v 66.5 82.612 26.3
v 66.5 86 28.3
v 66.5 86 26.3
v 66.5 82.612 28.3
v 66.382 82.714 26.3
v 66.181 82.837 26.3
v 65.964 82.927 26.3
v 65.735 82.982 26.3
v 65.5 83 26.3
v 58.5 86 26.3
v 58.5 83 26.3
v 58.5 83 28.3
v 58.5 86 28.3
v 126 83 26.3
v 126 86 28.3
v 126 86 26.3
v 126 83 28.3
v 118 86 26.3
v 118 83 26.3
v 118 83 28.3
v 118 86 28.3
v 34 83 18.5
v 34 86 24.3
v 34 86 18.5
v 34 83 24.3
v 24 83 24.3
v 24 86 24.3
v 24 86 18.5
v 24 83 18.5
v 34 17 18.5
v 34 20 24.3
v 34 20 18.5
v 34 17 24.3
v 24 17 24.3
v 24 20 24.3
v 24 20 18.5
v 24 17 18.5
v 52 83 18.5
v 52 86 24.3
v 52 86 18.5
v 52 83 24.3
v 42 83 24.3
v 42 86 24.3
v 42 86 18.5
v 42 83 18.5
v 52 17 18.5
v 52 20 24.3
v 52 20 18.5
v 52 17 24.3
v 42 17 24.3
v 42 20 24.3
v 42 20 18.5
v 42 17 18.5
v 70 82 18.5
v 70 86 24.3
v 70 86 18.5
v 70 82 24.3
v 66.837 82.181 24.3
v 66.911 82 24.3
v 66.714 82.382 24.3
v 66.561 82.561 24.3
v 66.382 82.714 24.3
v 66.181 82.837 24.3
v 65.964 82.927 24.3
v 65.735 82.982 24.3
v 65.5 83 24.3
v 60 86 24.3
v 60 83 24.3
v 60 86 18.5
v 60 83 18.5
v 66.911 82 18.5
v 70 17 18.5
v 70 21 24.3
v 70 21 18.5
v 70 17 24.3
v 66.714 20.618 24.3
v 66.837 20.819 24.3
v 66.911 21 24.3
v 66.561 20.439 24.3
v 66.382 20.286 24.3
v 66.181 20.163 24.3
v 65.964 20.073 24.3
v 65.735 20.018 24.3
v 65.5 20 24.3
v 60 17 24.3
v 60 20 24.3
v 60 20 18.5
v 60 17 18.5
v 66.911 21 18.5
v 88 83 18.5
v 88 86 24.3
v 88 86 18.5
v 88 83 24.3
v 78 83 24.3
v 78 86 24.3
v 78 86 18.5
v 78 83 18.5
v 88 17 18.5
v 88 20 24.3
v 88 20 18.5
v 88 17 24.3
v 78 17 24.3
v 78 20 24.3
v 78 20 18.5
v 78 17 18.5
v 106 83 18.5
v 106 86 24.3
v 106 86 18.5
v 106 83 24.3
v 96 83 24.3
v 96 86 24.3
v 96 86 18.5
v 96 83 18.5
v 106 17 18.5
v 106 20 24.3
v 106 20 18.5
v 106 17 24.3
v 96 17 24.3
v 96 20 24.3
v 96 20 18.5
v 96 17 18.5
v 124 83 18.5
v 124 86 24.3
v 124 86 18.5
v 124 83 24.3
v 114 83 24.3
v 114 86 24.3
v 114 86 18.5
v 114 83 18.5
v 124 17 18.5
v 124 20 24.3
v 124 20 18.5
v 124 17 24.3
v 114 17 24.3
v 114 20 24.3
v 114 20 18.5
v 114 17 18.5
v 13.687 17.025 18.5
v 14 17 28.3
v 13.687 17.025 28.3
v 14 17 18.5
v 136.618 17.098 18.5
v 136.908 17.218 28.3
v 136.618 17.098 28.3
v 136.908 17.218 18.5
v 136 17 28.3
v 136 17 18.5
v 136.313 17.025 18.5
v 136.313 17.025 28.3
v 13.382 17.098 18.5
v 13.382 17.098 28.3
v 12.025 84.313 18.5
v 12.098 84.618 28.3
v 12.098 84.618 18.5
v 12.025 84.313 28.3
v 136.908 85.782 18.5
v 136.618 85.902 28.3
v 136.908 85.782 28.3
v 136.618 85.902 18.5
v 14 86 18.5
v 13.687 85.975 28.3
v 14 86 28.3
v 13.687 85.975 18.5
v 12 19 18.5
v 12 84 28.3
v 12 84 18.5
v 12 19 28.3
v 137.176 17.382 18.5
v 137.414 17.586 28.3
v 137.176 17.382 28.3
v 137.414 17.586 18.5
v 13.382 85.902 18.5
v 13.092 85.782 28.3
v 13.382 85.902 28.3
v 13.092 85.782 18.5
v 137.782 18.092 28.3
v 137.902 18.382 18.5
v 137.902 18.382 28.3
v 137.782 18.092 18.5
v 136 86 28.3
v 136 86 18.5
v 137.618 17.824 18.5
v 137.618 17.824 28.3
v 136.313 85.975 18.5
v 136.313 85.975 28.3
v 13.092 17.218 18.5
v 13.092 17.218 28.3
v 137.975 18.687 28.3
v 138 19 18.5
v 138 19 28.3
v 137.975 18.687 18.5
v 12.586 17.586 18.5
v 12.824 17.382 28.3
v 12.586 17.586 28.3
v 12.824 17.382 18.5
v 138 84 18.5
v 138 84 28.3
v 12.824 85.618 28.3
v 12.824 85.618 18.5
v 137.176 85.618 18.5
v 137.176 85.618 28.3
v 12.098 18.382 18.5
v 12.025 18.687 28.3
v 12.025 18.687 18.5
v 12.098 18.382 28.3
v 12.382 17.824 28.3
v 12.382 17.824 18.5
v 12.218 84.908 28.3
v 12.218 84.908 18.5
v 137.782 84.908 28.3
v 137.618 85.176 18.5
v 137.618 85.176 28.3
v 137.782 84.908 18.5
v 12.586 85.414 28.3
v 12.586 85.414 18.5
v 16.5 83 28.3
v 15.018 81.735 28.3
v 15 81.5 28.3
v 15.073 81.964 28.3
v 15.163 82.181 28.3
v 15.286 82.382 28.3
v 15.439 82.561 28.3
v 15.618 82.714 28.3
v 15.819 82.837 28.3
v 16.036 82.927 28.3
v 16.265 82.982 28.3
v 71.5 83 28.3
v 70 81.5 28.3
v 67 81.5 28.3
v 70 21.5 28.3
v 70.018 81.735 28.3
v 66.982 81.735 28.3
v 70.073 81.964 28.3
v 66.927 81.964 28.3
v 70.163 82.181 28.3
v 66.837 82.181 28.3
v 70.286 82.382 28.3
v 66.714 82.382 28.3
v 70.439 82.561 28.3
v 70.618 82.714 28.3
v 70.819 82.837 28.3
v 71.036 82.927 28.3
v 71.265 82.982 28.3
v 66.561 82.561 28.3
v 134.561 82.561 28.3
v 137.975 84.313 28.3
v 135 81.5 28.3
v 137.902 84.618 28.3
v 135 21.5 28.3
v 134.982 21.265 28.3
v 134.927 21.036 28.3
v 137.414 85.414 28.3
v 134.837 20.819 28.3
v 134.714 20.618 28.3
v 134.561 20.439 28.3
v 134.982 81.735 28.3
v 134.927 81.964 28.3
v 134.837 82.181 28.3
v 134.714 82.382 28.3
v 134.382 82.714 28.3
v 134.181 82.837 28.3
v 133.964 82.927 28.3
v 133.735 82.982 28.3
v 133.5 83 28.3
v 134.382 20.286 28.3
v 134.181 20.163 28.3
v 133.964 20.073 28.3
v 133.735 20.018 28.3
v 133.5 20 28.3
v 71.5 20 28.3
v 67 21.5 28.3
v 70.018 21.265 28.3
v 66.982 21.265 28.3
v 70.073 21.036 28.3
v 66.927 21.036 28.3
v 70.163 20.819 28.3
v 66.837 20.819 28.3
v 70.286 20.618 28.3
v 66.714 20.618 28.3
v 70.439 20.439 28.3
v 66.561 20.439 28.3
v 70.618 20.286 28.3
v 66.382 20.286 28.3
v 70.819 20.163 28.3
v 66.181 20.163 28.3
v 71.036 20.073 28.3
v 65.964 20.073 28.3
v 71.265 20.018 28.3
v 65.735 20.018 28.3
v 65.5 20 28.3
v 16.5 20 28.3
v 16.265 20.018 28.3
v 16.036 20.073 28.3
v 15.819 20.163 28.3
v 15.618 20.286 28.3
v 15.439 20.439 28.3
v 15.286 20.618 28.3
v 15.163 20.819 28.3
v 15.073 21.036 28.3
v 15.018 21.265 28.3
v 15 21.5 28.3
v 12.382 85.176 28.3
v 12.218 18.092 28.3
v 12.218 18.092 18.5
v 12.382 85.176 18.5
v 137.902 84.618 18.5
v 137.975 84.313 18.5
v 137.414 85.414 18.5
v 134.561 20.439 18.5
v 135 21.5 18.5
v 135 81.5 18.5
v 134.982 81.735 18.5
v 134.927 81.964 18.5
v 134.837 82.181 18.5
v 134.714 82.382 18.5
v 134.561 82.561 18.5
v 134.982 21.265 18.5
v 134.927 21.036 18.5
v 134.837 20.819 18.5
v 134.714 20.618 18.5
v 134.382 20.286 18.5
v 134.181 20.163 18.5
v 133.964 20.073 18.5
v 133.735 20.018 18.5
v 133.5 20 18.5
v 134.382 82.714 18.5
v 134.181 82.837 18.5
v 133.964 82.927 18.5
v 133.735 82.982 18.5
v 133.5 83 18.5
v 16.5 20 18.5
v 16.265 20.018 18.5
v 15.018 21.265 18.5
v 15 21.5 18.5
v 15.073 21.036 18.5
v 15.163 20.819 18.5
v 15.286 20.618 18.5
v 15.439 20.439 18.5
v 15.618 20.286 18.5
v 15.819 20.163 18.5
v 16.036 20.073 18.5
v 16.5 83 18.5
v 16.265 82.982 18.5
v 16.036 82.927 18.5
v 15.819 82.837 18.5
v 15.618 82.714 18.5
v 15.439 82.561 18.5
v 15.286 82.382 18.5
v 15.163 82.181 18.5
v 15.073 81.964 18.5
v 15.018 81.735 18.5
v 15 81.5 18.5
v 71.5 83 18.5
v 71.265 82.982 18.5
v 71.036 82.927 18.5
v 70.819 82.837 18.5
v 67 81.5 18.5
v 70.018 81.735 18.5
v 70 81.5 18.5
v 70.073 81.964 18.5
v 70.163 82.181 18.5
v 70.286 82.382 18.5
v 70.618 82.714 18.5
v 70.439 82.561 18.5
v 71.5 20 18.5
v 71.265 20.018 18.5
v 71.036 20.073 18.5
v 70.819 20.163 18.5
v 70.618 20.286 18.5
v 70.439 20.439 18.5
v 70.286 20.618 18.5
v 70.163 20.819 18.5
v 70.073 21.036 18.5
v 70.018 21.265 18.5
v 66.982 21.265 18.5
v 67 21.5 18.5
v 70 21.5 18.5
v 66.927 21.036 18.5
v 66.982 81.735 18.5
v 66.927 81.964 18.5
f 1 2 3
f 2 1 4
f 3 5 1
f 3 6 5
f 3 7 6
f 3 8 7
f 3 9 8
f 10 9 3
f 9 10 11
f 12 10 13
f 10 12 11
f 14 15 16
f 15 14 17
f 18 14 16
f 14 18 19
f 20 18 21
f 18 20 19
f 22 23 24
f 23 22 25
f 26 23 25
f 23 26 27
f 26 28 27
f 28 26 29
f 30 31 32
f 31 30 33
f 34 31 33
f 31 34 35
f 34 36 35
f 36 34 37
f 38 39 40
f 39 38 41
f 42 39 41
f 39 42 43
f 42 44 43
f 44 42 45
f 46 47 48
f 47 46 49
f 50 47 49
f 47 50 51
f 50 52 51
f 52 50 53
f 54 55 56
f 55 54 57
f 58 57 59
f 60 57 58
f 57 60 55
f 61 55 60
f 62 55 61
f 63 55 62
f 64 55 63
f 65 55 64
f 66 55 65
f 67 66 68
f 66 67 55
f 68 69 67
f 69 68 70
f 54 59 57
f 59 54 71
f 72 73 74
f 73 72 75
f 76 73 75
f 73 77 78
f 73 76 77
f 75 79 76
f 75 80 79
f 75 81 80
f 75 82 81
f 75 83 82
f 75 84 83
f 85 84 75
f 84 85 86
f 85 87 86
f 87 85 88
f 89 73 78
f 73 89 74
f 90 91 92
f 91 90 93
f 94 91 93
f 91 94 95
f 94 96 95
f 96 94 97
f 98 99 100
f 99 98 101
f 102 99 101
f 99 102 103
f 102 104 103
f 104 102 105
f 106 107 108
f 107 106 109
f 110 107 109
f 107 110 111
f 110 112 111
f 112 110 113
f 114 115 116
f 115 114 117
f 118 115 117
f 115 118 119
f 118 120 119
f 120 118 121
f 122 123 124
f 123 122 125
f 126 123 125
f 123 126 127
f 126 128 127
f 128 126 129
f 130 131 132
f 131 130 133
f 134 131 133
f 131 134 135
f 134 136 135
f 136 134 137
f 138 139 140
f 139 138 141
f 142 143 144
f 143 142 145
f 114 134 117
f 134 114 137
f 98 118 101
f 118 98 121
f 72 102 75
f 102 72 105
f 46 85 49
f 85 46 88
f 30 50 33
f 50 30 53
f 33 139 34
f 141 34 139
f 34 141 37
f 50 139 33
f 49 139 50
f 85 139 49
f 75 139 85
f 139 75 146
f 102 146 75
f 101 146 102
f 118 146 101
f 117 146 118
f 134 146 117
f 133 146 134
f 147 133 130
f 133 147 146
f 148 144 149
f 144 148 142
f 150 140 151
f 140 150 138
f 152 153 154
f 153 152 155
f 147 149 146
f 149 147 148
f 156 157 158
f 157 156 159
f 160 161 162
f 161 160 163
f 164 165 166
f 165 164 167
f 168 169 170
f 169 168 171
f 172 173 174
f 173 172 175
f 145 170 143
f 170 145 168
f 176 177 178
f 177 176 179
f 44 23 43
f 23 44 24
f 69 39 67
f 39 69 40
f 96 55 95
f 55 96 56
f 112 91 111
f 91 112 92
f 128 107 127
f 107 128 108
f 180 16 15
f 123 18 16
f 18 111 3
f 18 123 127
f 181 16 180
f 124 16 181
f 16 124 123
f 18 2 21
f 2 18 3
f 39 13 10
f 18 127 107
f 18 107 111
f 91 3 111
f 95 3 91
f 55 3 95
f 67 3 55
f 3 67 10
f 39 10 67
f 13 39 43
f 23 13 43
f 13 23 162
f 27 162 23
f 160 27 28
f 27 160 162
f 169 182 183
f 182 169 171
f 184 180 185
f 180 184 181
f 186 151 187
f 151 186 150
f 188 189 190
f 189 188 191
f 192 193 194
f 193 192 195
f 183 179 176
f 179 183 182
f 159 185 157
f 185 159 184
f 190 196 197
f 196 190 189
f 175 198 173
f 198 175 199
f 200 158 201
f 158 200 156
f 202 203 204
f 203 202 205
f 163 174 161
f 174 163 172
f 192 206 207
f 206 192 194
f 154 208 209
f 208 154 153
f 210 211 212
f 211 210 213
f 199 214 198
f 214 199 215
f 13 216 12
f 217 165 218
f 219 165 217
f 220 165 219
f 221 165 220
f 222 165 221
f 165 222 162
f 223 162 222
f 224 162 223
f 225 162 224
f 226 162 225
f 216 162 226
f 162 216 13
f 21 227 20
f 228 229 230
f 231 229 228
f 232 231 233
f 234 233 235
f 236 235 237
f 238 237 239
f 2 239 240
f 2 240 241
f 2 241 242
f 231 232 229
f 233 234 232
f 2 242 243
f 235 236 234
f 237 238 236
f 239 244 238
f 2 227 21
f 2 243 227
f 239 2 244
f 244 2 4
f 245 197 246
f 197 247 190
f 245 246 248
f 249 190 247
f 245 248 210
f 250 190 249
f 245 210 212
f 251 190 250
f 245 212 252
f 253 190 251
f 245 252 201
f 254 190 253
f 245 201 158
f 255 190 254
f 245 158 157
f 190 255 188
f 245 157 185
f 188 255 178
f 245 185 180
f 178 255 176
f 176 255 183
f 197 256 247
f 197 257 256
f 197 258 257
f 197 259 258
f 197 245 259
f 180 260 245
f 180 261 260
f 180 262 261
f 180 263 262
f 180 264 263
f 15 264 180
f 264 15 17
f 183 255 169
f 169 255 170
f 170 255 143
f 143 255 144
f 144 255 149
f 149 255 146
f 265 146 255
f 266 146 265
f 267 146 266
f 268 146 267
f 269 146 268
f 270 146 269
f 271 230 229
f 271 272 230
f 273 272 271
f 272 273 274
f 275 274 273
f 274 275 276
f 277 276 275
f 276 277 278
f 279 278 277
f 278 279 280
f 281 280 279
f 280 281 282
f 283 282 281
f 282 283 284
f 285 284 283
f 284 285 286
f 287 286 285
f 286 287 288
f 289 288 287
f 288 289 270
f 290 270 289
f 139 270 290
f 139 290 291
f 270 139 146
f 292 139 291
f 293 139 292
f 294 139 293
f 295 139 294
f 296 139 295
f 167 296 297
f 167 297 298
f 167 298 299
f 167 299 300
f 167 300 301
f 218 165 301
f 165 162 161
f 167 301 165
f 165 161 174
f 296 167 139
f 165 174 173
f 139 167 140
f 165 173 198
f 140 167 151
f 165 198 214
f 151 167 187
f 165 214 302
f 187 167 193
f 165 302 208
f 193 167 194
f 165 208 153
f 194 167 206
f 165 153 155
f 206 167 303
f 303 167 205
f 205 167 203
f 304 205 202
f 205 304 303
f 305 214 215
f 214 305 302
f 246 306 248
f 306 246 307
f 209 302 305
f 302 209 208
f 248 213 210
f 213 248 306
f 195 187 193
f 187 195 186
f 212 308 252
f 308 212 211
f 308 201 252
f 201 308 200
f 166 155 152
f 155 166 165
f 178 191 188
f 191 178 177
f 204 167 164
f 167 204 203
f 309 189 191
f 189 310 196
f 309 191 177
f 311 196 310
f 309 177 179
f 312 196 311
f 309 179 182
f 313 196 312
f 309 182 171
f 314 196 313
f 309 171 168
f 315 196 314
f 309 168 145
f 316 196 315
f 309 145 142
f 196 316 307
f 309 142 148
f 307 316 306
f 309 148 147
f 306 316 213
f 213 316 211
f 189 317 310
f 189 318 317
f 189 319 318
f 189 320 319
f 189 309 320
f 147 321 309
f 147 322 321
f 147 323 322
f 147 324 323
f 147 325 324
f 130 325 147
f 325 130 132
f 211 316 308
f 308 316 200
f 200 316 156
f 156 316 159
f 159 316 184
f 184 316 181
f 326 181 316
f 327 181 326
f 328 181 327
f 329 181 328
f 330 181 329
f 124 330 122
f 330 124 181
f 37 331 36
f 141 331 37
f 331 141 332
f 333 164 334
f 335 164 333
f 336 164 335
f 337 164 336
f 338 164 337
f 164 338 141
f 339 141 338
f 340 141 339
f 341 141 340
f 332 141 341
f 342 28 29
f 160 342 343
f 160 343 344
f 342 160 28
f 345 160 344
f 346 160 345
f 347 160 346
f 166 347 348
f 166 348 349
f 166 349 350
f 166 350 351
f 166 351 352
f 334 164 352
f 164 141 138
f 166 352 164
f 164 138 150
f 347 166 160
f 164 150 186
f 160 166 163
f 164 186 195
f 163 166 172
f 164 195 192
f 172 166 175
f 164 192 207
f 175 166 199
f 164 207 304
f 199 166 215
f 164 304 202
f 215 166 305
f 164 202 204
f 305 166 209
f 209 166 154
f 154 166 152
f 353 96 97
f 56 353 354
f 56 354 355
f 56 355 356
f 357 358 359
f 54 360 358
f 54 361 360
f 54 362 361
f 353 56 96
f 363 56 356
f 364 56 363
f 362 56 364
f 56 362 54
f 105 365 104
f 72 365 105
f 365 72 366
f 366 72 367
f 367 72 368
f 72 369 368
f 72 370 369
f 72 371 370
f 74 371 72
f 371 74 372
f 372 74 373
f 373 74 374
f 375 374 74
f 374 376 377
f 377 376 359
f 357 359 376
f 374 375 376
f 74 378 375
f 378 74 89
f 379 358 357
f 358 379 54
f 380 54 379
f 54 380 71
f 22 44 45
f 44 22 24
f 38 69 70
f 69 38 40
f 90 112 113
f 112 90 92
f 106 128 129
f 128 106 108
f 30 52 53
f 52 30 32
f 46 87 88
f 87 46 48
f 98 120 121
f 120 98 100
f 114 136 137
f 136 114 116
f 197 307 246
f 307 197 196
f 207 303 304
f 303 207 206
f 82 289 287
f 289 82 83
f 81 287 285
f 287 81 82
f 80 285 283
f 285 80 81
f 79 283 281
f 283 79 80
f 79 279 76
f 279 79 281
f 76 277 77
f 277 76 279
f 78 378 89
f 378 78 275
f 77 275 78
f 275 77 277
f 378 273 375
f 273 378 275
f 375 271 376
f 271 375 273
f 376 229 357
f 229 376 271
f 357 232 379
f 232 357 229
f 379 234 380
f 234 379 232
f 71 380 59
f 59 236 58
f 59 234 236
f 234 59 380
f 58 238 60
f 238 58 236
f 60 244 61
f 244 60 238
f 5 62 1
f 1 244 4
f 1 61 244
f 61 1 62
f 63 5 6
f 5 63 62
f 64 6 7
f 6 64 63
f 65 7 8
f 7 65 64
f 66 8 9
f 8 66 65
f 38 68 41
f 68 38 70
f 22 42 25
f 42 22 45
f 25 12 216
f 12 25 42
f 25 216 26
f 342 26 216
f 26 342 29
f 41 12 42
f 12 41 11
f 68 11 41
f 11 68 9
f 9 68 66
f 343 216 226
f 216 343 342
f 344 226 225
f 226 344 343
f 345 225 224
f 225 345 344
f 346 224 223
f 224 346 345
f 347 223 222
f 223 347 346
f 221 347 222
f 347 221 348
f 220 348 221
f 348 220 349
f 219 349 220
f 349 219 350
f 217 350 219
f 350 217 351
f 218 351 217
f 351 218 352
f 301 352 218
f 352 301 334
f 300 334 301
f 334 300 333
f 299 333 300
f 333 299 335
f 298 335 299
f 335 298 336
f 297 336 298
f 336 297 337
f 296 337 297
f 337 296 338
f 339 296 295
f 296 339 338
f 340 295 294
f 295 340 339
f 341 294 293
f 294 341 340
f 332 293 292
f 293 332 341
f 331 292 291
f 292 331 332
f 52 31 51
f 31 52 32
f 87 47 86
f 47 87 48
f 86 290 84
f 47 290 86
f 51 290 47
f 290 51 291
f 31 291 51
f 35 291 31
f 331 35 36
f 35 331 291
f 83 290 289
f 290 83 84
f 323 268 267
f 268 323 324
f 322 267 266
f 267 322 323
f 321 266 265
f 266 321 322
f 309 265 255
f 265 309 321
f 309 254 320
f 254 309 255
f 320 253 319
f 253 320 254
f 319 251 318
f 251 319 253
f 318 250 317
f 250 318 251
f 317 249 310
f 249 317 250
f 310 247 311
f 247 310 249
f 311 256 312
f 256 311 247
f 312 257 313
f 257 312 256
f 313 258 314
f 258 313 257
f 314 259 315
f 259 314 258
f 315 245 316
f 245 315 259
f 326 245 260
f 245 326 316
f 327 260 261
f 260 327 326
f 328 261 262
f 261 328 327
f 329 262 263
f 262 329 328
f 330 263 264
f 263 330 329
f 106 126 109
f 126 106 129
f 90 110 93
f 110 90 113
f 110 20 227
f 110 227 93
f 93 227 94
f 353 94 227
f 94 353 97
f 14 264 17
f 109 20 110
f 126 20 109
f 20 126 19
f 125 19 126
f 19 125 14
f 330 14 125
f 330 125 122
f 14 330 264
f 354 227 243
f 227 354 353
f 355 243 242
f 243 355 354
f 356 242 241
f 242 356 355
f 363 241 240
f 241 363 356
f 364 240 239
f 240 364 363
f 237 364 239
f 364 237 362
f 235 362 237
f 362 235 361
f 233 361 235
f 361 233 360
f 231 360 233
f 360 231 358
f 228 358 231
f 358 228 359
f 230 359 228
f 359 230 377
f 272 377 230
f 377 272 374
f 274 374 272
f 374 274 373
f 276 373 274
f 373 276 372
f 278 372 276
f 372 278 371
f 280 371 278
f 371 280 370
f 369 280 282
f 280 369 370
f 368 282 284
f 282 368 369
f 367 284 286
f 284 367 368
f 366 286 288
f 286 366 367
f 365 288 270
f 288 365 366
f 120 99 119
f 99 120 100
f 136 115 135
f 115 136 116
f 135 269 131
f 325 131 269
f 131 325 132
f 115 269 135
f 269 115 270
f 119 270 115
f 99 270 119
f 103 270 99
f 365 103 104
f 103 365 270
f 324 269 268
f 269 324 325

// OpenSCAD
// file: common.scad
// Pi Flux r1 - reverse-engineered shared parameters
// Coordinates: x = left->right as seen from the FRONT, y = top->bottom
// (top edge = pull-switch side), z = 0 at the back surface, up towards the screen.
// Use at(x,y) to place things in these "drawing" coordinates.

$fn = 40;

// ---------------- overall ----------------
W        = 150;     // outer width
L        = 183;     // outer height
CH       = 9;       // corner chamfer
WALL     = 3;       // side wall thickness
FLOOR    = 2;       // back plate thickness
H_BOT    = 24;      // bottom shell height (split plane)
H_FACE   = 10.5;    // face part height
T        = H_BOT + H_FACE; // total thickness
PLATE    = 2;       // face plate thickness
TOL      = 0.25;

// ---------------- screws ----------------
M25_CLR  = 2.8;     // clearance hole
M25_PIL  = 2.2;     // pilot hole for self tapping into plastic (use 3.6 for brass insert)
M25_HEAD = 5.2;     // counterbore for head
BOSS_D   = 7;
// 6 case screws: 4 corners + 2 on the screen/keyboard divider
CASE_SCREWS = [[8.5,8.5],[W-8.5,8.5],[6.5,90],[W-6.5,90],[8.5,L-8.5],[W-8.5,L-8.5]];

// ---------------- display (Waveshare 5-DSI-TOUCH-A) ----------------
DISP_W = 129; DISP_H = 72.8; DISP_T = 7.8; DISP_R = 4; DISP_POST = 5;
DISP_X = (W-DISP_W)/2;  // left edge of glass
DISP_Y = 13;            // top edge of glass
DISP_Z_FRONT = T - PLATE;
DISP_Z_BACK  = DISP_Z_FRONT - DISP_T;
DISP_POST_END = DISP_Z_BACK - DISP_POST;   // where the display's own standoffs end
// outer 117 x 61 M2.5 pattern (6 / 5.9 mm from glass edges)
DISP_HOLES = [for (dx=[6, 6+117]) for (dy=[5.9, 5.9+61]) [DISP_X+dx, DISP_Y+dy]];

// ---------------- Raspberry Pi 5 (mounted on the display back) -----
// inner 58 x 49 pattern; ports point to the RIGHT wall, USB-C edge to the TOP
PI_HOLES_X = [DISP_X+45.5, DISP_X+45.5+58];
PI_HOLES_Y = [DISP_Y+11.9, DISP_Y+11.9+49];
PI_X0 = PI_HOLES_X[0]-3.5;          // non-port end of the board
PI_Y0 = PI_HOLES_Y[0]-3.5;          // USB-C / HDMI edge
PI_PCB_TOP = DISP_POST_END;         // pcb face against the posts
PI_PCB_BOT = PI_PCB_TOP - 1.6;      // component side faces the back plate
PI_USBC_X  = PI_X0 + 11.2;
PI_USBC_Z  = PI_PCB_BOT - 1.6;
// right-edge ports (centre measured from the USB-C edge, width, height)
PI_PORTS = [[10.2, 16.0, 13.6], [29.1, 13.4, 16.0], [47.0, 13.4, 16.0]];

// ---------------- battery (INIU 10000 mAh) ----------------
BAT_W = 112; BAT_H = 70; BAT_T = 16;      // measure yours!
BAT_X = (W-BAT_W)/2;
BAT_Y = L - WALL - 5.5 - BAT_H;            // leaves room for the button plunger
BTN_X = 108;                                // battery button position along the bottom edge
BTN_Z = FLOOR + BAT_T/2;
BTN_W = 6; BTN_HH = 4;                      // button plunger cross-section

// ---------------- pull switch (USB-C U adapter) ----------------
PULL_SLOT_X0 = 46.2; PULL_SLOT_W = 27.5;    // from the mat drawing (46.2 | 27.5 | 66.2)
PULL_GROOVE = 0.8;                          // floor groove the carrier rides in
// USB-C U (180 deg) adapter, standing upright: male plug on top (into the Pi),
// female socket below (battery cable, runs under the Pi / through the cooler fins)
UADP = [7.0, 12.5, 20.5];                   // body thickness(x), depth(y, excl. plug), height(z) - measure yours!
UADP_MALE_FROM_TOP = 5.25;                  // body top -> male plug centre
UADP_PLUG = 6.5;                            // male plug length
PULL_TRAVEL = 7;

// ---------------- keyboard ----------------
KB_WIN = [10, 97, 140, 164];                // x0,y0,x1,y1 of key window in face plate
KB_PCB = [137, 72];                         // keyboard PCB outline
KB_PCB_X = (W-KB_PCB[0])/2; KB_PCB_Y = 94.5;
KB_PCB_FRONT = T - 5;                       // z of the PCB front face
KB_PCB_BACK  = KB_PCB_FRONT - 1.2;

// ---------------- helpers ----------------
module at(x, y, z=0) translate([x, L-y, z]) children();

// base chamfered rectangle (in real XY, origin bottom-left)
module chamfer_rect(w, l, c) {
    polygon([[c,0],[w-c,0],[w,c],[w,l-c],[w-c,l],[c,l],[0,l-c],[0,c]]);
}

// ---------------- rugged exterior ----------------
// The body edges carry a large 45 deg chamfer (front and back), so the full-height corner
// bumpers stand proud in every view. The grip sides carry vertical ribs. All of it is
// printable without supports: the chamfers are 45 deg overhangs, the ribs are vertical.
EDGE_CZ = 3;        // edge chamfer (front + back), measured from the rib tips
BUMP    = 3;        // corner bumper protrusion beyond the body
BUMP_LX = 26;       // bumper length along the top/bottom edges (from the corner)
BUMP_LY = 21;       // ... along the sides (the first Pi port window starts at y=23)
BUMP_CZ = 1.2;      // small chamfer on the bumpers
RIB_H = 1.2; RIB_W = 1.6; RIB_P = 4;   // grip ribs: height, width, pitch
// grip rib zones: [side (0 = left, 1 = right), y0, y1] in drawing coords
RIB_ZONES = [[0, 54, 160], [1, 82, 160]];

module body2d() offset(r=1) offset(delta=-1) chamfer_rect(W, L, CH);

module ribs2d() {
    for (z = RIB_ZONES) for (y = [z[1] : RIB_P : z[2] - RIB_W]) {
        translate([z[0] ? W : 0, L - y - RIB_W]) mirror([z[0] ? 0 : 1, 0])
            polygon([[-0.5, 0], [RIB_H - 0.4, 0], [RIB_H, 0.4], [RIB_H, RIB_W - 0.4], [RIB_H - 0.4, RIB_W], [-0.5, RIB_W]]);
    }
}

// one bumper per corner; 45 deg tapered ends where it meets the body
module bumper2d() {
    win = [[-20, -20], [BUMP_LX - 20, -20], [BUMP_LX + 1, 1], [1, BUMP_LY + 1], [-20, BUMP_LY - 20]];
    intersection() {
        offset(r=1) offset(delta=-1) offset(delta=BUMP) chamfer_rect(W, L, CH);
        for (mx = [0, 1]) for (my = [0, 1])
            translate([mx * W, my * L]) mirror([mx, 0]) mirror([0, my]) polygon(win);
    }
}

// convex chamfered slab around the chamfer_rect body, grown by d
module chamfer_slab(d, c, h=T) hull() {
    linear_extrude(0.01) offset(delta=d - c) chamfer_rect(W, L, CH);
    translate([0, 0, c]) linear_extrude(h - 2 * c) offset(delta=d) chamfer_rect(W, L, CH);
    translate([0, 0, h - 0.01]) linear_extrude(0.01) offset(delta=d - c) chamfer_rect(W, L, CH);
}

// complete closed outer body, z = 0 .. T (each part intersects its own z range)
module outer_body() {
    intersection() {
        linear_extrude(T) { body2d(); ribs2d(); }
        chamfer_slab(RIB_H, EDGE_CZ);
    }
    intersection() {
        linear_extrude(T) bumper2d();
        chamfer_slab(BUMP, BUMP_CZ);
    }
}
module inner_outline() offset(delta=-WALL) offset(r=1) offset(delta=-1) chamfer_rect(W, L, CH);

module rrect(w, h, r) offset(r=r) offset(delta=-r) square([w, h]);
// main file
// Pi Flux r1 - Internal keyboard support frame
// Sits on top of the power bank and backs up the keyboard PCB (two windows for the
// keyboard's own LiPo / components). Print flat, as modelled.
include <common.scad>

KBS_Z0 = FLOOR + BAT_T + 0.5;        // underside (on the battery)
KBS_H  = KB_PCB_BACK - KBS_Z0;       // up to the back of the keyboard pcb
KBS    = [12, 97, 138, 166];         // x0,y0,x1,y1
KBS_WALL = 3;
KBS_DIV  = 68.5;                     // divider x (right window clears the keyboard LiPo)

module kb_support() {
    translate([0,0,KBS_Z0]) difference() {
        linear_extrude(KBS_H) translate([KBS[0], L-KBS[3]]) rrect(KBS[2]-KBS[0], KBS[3]-KBS[1], 2);
        // windows
        translate([0,0,-1]) linear_extrude(KBS_H+2) {
            translate([KBS[0]+KBS_WALL, L-KBS[3]+KBS_WALL]) rrect(KBS_DIV-1.5-KBS[0]-KBS_WALL, KBS[3]-KBS[1]-2*KBS_WALL, 1.5);
            translate([KBS_DIV+1.5, L-KBS[3]+KBS_WALL]) rrect(KBS[2]-KBS_WALL-KBS_DIV-1.5, KBS[3]-KBS[1]-2*KBS_WALL, 1.5);
        }
        // wire relief notches on top edge (battery wire of the keyboard, see guide p.8)
        for (x=[KBS_DIV-10, KBS[2]-20]) at(x, KBS[1]-1, KBS_H-2) translate([0,-KBS_WALL-2,0]) cube([8, KBS_WALL+2, 3]);
        // lighten / flex slots in the long walls
        for (x=[KBS[0]+12 : 18 : KBS[2]-20]) for (y=[KBS[1]-1, KBS[3]-KBS_WALL-1])
            at(x, y+KBS_WALL+2, -1) cube([10, KBS_WALL+2, KBS_H-3]);
    }
}
if (is_undef(ASSEMBLY)) kb_support();
